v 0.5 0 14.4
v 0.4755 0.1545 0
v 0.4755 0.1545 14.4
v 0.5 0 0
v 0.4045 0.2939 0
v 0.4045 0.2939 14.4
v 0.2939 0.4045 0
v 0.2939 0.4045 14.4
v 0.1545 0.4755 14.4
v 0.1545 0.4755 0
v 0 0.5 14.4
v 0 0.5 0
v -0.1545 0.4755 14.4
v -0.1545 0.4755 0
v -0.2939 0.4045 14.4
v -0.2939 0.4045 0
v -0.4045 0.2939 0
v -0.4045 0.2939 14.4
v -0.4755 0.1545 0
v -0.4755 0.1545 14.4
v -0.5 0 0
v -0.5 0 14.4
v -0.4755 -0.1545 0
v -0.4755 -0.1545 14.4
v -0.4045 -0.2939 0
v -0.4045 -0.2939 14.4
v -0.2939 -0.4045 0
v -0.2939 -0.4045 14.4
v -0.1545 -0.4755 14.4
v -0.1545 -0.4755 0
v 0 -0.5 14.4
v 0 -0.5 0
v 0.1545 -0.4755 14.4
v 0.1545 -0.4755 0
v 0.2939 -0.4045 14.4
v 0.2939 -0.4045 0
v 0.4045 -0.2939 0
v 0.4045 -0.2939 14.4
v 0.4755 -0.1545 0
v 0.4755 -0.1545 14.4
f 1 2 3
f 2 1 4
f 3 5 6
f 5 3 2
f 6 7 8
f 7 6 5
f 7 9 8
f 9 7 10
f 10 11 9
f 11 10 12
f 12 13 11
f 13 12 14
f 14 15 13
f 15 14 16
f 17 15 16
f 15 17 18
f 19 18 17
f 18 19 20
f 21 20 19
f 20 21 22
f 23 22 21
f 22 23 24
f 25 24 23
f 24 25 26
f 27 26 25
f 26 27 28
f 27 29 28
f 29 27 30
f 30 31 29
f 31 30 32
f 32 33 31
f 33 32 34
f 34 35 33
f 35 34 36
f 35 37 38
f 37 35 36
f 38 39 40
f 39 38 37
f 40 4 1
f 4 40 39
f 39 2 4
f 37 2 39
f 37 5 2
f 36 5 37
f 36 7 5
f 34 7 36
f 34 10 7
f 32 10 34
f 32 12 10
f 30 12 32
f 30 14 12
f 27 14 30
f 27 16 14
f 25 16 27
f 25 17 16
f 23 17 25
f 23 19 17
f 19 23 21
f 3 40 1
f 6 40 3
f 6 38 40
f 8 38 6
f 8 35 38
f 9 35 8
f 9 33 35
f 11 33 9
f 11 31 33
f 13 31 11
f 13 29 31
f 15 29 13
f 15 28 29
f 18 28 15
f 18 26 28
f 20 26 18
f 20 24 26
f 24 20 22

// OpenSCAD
// part_id: jup17
// name: Jupiter orb rod small
// source_drawing_ids: DRW-012
// units: mm
// revision: 0.1
// SPDX-License-Identifier: MIT

module part_jup17(d = 1.0, h = 14.4) {
    cylinder(d = d, h = h, center = false, $fn = 20);
}

// ---- "main guard" ----
// Default to previewing when opened directly:
if (is_undef(__LIB_MODE__)) {
    part_jup17();
}
